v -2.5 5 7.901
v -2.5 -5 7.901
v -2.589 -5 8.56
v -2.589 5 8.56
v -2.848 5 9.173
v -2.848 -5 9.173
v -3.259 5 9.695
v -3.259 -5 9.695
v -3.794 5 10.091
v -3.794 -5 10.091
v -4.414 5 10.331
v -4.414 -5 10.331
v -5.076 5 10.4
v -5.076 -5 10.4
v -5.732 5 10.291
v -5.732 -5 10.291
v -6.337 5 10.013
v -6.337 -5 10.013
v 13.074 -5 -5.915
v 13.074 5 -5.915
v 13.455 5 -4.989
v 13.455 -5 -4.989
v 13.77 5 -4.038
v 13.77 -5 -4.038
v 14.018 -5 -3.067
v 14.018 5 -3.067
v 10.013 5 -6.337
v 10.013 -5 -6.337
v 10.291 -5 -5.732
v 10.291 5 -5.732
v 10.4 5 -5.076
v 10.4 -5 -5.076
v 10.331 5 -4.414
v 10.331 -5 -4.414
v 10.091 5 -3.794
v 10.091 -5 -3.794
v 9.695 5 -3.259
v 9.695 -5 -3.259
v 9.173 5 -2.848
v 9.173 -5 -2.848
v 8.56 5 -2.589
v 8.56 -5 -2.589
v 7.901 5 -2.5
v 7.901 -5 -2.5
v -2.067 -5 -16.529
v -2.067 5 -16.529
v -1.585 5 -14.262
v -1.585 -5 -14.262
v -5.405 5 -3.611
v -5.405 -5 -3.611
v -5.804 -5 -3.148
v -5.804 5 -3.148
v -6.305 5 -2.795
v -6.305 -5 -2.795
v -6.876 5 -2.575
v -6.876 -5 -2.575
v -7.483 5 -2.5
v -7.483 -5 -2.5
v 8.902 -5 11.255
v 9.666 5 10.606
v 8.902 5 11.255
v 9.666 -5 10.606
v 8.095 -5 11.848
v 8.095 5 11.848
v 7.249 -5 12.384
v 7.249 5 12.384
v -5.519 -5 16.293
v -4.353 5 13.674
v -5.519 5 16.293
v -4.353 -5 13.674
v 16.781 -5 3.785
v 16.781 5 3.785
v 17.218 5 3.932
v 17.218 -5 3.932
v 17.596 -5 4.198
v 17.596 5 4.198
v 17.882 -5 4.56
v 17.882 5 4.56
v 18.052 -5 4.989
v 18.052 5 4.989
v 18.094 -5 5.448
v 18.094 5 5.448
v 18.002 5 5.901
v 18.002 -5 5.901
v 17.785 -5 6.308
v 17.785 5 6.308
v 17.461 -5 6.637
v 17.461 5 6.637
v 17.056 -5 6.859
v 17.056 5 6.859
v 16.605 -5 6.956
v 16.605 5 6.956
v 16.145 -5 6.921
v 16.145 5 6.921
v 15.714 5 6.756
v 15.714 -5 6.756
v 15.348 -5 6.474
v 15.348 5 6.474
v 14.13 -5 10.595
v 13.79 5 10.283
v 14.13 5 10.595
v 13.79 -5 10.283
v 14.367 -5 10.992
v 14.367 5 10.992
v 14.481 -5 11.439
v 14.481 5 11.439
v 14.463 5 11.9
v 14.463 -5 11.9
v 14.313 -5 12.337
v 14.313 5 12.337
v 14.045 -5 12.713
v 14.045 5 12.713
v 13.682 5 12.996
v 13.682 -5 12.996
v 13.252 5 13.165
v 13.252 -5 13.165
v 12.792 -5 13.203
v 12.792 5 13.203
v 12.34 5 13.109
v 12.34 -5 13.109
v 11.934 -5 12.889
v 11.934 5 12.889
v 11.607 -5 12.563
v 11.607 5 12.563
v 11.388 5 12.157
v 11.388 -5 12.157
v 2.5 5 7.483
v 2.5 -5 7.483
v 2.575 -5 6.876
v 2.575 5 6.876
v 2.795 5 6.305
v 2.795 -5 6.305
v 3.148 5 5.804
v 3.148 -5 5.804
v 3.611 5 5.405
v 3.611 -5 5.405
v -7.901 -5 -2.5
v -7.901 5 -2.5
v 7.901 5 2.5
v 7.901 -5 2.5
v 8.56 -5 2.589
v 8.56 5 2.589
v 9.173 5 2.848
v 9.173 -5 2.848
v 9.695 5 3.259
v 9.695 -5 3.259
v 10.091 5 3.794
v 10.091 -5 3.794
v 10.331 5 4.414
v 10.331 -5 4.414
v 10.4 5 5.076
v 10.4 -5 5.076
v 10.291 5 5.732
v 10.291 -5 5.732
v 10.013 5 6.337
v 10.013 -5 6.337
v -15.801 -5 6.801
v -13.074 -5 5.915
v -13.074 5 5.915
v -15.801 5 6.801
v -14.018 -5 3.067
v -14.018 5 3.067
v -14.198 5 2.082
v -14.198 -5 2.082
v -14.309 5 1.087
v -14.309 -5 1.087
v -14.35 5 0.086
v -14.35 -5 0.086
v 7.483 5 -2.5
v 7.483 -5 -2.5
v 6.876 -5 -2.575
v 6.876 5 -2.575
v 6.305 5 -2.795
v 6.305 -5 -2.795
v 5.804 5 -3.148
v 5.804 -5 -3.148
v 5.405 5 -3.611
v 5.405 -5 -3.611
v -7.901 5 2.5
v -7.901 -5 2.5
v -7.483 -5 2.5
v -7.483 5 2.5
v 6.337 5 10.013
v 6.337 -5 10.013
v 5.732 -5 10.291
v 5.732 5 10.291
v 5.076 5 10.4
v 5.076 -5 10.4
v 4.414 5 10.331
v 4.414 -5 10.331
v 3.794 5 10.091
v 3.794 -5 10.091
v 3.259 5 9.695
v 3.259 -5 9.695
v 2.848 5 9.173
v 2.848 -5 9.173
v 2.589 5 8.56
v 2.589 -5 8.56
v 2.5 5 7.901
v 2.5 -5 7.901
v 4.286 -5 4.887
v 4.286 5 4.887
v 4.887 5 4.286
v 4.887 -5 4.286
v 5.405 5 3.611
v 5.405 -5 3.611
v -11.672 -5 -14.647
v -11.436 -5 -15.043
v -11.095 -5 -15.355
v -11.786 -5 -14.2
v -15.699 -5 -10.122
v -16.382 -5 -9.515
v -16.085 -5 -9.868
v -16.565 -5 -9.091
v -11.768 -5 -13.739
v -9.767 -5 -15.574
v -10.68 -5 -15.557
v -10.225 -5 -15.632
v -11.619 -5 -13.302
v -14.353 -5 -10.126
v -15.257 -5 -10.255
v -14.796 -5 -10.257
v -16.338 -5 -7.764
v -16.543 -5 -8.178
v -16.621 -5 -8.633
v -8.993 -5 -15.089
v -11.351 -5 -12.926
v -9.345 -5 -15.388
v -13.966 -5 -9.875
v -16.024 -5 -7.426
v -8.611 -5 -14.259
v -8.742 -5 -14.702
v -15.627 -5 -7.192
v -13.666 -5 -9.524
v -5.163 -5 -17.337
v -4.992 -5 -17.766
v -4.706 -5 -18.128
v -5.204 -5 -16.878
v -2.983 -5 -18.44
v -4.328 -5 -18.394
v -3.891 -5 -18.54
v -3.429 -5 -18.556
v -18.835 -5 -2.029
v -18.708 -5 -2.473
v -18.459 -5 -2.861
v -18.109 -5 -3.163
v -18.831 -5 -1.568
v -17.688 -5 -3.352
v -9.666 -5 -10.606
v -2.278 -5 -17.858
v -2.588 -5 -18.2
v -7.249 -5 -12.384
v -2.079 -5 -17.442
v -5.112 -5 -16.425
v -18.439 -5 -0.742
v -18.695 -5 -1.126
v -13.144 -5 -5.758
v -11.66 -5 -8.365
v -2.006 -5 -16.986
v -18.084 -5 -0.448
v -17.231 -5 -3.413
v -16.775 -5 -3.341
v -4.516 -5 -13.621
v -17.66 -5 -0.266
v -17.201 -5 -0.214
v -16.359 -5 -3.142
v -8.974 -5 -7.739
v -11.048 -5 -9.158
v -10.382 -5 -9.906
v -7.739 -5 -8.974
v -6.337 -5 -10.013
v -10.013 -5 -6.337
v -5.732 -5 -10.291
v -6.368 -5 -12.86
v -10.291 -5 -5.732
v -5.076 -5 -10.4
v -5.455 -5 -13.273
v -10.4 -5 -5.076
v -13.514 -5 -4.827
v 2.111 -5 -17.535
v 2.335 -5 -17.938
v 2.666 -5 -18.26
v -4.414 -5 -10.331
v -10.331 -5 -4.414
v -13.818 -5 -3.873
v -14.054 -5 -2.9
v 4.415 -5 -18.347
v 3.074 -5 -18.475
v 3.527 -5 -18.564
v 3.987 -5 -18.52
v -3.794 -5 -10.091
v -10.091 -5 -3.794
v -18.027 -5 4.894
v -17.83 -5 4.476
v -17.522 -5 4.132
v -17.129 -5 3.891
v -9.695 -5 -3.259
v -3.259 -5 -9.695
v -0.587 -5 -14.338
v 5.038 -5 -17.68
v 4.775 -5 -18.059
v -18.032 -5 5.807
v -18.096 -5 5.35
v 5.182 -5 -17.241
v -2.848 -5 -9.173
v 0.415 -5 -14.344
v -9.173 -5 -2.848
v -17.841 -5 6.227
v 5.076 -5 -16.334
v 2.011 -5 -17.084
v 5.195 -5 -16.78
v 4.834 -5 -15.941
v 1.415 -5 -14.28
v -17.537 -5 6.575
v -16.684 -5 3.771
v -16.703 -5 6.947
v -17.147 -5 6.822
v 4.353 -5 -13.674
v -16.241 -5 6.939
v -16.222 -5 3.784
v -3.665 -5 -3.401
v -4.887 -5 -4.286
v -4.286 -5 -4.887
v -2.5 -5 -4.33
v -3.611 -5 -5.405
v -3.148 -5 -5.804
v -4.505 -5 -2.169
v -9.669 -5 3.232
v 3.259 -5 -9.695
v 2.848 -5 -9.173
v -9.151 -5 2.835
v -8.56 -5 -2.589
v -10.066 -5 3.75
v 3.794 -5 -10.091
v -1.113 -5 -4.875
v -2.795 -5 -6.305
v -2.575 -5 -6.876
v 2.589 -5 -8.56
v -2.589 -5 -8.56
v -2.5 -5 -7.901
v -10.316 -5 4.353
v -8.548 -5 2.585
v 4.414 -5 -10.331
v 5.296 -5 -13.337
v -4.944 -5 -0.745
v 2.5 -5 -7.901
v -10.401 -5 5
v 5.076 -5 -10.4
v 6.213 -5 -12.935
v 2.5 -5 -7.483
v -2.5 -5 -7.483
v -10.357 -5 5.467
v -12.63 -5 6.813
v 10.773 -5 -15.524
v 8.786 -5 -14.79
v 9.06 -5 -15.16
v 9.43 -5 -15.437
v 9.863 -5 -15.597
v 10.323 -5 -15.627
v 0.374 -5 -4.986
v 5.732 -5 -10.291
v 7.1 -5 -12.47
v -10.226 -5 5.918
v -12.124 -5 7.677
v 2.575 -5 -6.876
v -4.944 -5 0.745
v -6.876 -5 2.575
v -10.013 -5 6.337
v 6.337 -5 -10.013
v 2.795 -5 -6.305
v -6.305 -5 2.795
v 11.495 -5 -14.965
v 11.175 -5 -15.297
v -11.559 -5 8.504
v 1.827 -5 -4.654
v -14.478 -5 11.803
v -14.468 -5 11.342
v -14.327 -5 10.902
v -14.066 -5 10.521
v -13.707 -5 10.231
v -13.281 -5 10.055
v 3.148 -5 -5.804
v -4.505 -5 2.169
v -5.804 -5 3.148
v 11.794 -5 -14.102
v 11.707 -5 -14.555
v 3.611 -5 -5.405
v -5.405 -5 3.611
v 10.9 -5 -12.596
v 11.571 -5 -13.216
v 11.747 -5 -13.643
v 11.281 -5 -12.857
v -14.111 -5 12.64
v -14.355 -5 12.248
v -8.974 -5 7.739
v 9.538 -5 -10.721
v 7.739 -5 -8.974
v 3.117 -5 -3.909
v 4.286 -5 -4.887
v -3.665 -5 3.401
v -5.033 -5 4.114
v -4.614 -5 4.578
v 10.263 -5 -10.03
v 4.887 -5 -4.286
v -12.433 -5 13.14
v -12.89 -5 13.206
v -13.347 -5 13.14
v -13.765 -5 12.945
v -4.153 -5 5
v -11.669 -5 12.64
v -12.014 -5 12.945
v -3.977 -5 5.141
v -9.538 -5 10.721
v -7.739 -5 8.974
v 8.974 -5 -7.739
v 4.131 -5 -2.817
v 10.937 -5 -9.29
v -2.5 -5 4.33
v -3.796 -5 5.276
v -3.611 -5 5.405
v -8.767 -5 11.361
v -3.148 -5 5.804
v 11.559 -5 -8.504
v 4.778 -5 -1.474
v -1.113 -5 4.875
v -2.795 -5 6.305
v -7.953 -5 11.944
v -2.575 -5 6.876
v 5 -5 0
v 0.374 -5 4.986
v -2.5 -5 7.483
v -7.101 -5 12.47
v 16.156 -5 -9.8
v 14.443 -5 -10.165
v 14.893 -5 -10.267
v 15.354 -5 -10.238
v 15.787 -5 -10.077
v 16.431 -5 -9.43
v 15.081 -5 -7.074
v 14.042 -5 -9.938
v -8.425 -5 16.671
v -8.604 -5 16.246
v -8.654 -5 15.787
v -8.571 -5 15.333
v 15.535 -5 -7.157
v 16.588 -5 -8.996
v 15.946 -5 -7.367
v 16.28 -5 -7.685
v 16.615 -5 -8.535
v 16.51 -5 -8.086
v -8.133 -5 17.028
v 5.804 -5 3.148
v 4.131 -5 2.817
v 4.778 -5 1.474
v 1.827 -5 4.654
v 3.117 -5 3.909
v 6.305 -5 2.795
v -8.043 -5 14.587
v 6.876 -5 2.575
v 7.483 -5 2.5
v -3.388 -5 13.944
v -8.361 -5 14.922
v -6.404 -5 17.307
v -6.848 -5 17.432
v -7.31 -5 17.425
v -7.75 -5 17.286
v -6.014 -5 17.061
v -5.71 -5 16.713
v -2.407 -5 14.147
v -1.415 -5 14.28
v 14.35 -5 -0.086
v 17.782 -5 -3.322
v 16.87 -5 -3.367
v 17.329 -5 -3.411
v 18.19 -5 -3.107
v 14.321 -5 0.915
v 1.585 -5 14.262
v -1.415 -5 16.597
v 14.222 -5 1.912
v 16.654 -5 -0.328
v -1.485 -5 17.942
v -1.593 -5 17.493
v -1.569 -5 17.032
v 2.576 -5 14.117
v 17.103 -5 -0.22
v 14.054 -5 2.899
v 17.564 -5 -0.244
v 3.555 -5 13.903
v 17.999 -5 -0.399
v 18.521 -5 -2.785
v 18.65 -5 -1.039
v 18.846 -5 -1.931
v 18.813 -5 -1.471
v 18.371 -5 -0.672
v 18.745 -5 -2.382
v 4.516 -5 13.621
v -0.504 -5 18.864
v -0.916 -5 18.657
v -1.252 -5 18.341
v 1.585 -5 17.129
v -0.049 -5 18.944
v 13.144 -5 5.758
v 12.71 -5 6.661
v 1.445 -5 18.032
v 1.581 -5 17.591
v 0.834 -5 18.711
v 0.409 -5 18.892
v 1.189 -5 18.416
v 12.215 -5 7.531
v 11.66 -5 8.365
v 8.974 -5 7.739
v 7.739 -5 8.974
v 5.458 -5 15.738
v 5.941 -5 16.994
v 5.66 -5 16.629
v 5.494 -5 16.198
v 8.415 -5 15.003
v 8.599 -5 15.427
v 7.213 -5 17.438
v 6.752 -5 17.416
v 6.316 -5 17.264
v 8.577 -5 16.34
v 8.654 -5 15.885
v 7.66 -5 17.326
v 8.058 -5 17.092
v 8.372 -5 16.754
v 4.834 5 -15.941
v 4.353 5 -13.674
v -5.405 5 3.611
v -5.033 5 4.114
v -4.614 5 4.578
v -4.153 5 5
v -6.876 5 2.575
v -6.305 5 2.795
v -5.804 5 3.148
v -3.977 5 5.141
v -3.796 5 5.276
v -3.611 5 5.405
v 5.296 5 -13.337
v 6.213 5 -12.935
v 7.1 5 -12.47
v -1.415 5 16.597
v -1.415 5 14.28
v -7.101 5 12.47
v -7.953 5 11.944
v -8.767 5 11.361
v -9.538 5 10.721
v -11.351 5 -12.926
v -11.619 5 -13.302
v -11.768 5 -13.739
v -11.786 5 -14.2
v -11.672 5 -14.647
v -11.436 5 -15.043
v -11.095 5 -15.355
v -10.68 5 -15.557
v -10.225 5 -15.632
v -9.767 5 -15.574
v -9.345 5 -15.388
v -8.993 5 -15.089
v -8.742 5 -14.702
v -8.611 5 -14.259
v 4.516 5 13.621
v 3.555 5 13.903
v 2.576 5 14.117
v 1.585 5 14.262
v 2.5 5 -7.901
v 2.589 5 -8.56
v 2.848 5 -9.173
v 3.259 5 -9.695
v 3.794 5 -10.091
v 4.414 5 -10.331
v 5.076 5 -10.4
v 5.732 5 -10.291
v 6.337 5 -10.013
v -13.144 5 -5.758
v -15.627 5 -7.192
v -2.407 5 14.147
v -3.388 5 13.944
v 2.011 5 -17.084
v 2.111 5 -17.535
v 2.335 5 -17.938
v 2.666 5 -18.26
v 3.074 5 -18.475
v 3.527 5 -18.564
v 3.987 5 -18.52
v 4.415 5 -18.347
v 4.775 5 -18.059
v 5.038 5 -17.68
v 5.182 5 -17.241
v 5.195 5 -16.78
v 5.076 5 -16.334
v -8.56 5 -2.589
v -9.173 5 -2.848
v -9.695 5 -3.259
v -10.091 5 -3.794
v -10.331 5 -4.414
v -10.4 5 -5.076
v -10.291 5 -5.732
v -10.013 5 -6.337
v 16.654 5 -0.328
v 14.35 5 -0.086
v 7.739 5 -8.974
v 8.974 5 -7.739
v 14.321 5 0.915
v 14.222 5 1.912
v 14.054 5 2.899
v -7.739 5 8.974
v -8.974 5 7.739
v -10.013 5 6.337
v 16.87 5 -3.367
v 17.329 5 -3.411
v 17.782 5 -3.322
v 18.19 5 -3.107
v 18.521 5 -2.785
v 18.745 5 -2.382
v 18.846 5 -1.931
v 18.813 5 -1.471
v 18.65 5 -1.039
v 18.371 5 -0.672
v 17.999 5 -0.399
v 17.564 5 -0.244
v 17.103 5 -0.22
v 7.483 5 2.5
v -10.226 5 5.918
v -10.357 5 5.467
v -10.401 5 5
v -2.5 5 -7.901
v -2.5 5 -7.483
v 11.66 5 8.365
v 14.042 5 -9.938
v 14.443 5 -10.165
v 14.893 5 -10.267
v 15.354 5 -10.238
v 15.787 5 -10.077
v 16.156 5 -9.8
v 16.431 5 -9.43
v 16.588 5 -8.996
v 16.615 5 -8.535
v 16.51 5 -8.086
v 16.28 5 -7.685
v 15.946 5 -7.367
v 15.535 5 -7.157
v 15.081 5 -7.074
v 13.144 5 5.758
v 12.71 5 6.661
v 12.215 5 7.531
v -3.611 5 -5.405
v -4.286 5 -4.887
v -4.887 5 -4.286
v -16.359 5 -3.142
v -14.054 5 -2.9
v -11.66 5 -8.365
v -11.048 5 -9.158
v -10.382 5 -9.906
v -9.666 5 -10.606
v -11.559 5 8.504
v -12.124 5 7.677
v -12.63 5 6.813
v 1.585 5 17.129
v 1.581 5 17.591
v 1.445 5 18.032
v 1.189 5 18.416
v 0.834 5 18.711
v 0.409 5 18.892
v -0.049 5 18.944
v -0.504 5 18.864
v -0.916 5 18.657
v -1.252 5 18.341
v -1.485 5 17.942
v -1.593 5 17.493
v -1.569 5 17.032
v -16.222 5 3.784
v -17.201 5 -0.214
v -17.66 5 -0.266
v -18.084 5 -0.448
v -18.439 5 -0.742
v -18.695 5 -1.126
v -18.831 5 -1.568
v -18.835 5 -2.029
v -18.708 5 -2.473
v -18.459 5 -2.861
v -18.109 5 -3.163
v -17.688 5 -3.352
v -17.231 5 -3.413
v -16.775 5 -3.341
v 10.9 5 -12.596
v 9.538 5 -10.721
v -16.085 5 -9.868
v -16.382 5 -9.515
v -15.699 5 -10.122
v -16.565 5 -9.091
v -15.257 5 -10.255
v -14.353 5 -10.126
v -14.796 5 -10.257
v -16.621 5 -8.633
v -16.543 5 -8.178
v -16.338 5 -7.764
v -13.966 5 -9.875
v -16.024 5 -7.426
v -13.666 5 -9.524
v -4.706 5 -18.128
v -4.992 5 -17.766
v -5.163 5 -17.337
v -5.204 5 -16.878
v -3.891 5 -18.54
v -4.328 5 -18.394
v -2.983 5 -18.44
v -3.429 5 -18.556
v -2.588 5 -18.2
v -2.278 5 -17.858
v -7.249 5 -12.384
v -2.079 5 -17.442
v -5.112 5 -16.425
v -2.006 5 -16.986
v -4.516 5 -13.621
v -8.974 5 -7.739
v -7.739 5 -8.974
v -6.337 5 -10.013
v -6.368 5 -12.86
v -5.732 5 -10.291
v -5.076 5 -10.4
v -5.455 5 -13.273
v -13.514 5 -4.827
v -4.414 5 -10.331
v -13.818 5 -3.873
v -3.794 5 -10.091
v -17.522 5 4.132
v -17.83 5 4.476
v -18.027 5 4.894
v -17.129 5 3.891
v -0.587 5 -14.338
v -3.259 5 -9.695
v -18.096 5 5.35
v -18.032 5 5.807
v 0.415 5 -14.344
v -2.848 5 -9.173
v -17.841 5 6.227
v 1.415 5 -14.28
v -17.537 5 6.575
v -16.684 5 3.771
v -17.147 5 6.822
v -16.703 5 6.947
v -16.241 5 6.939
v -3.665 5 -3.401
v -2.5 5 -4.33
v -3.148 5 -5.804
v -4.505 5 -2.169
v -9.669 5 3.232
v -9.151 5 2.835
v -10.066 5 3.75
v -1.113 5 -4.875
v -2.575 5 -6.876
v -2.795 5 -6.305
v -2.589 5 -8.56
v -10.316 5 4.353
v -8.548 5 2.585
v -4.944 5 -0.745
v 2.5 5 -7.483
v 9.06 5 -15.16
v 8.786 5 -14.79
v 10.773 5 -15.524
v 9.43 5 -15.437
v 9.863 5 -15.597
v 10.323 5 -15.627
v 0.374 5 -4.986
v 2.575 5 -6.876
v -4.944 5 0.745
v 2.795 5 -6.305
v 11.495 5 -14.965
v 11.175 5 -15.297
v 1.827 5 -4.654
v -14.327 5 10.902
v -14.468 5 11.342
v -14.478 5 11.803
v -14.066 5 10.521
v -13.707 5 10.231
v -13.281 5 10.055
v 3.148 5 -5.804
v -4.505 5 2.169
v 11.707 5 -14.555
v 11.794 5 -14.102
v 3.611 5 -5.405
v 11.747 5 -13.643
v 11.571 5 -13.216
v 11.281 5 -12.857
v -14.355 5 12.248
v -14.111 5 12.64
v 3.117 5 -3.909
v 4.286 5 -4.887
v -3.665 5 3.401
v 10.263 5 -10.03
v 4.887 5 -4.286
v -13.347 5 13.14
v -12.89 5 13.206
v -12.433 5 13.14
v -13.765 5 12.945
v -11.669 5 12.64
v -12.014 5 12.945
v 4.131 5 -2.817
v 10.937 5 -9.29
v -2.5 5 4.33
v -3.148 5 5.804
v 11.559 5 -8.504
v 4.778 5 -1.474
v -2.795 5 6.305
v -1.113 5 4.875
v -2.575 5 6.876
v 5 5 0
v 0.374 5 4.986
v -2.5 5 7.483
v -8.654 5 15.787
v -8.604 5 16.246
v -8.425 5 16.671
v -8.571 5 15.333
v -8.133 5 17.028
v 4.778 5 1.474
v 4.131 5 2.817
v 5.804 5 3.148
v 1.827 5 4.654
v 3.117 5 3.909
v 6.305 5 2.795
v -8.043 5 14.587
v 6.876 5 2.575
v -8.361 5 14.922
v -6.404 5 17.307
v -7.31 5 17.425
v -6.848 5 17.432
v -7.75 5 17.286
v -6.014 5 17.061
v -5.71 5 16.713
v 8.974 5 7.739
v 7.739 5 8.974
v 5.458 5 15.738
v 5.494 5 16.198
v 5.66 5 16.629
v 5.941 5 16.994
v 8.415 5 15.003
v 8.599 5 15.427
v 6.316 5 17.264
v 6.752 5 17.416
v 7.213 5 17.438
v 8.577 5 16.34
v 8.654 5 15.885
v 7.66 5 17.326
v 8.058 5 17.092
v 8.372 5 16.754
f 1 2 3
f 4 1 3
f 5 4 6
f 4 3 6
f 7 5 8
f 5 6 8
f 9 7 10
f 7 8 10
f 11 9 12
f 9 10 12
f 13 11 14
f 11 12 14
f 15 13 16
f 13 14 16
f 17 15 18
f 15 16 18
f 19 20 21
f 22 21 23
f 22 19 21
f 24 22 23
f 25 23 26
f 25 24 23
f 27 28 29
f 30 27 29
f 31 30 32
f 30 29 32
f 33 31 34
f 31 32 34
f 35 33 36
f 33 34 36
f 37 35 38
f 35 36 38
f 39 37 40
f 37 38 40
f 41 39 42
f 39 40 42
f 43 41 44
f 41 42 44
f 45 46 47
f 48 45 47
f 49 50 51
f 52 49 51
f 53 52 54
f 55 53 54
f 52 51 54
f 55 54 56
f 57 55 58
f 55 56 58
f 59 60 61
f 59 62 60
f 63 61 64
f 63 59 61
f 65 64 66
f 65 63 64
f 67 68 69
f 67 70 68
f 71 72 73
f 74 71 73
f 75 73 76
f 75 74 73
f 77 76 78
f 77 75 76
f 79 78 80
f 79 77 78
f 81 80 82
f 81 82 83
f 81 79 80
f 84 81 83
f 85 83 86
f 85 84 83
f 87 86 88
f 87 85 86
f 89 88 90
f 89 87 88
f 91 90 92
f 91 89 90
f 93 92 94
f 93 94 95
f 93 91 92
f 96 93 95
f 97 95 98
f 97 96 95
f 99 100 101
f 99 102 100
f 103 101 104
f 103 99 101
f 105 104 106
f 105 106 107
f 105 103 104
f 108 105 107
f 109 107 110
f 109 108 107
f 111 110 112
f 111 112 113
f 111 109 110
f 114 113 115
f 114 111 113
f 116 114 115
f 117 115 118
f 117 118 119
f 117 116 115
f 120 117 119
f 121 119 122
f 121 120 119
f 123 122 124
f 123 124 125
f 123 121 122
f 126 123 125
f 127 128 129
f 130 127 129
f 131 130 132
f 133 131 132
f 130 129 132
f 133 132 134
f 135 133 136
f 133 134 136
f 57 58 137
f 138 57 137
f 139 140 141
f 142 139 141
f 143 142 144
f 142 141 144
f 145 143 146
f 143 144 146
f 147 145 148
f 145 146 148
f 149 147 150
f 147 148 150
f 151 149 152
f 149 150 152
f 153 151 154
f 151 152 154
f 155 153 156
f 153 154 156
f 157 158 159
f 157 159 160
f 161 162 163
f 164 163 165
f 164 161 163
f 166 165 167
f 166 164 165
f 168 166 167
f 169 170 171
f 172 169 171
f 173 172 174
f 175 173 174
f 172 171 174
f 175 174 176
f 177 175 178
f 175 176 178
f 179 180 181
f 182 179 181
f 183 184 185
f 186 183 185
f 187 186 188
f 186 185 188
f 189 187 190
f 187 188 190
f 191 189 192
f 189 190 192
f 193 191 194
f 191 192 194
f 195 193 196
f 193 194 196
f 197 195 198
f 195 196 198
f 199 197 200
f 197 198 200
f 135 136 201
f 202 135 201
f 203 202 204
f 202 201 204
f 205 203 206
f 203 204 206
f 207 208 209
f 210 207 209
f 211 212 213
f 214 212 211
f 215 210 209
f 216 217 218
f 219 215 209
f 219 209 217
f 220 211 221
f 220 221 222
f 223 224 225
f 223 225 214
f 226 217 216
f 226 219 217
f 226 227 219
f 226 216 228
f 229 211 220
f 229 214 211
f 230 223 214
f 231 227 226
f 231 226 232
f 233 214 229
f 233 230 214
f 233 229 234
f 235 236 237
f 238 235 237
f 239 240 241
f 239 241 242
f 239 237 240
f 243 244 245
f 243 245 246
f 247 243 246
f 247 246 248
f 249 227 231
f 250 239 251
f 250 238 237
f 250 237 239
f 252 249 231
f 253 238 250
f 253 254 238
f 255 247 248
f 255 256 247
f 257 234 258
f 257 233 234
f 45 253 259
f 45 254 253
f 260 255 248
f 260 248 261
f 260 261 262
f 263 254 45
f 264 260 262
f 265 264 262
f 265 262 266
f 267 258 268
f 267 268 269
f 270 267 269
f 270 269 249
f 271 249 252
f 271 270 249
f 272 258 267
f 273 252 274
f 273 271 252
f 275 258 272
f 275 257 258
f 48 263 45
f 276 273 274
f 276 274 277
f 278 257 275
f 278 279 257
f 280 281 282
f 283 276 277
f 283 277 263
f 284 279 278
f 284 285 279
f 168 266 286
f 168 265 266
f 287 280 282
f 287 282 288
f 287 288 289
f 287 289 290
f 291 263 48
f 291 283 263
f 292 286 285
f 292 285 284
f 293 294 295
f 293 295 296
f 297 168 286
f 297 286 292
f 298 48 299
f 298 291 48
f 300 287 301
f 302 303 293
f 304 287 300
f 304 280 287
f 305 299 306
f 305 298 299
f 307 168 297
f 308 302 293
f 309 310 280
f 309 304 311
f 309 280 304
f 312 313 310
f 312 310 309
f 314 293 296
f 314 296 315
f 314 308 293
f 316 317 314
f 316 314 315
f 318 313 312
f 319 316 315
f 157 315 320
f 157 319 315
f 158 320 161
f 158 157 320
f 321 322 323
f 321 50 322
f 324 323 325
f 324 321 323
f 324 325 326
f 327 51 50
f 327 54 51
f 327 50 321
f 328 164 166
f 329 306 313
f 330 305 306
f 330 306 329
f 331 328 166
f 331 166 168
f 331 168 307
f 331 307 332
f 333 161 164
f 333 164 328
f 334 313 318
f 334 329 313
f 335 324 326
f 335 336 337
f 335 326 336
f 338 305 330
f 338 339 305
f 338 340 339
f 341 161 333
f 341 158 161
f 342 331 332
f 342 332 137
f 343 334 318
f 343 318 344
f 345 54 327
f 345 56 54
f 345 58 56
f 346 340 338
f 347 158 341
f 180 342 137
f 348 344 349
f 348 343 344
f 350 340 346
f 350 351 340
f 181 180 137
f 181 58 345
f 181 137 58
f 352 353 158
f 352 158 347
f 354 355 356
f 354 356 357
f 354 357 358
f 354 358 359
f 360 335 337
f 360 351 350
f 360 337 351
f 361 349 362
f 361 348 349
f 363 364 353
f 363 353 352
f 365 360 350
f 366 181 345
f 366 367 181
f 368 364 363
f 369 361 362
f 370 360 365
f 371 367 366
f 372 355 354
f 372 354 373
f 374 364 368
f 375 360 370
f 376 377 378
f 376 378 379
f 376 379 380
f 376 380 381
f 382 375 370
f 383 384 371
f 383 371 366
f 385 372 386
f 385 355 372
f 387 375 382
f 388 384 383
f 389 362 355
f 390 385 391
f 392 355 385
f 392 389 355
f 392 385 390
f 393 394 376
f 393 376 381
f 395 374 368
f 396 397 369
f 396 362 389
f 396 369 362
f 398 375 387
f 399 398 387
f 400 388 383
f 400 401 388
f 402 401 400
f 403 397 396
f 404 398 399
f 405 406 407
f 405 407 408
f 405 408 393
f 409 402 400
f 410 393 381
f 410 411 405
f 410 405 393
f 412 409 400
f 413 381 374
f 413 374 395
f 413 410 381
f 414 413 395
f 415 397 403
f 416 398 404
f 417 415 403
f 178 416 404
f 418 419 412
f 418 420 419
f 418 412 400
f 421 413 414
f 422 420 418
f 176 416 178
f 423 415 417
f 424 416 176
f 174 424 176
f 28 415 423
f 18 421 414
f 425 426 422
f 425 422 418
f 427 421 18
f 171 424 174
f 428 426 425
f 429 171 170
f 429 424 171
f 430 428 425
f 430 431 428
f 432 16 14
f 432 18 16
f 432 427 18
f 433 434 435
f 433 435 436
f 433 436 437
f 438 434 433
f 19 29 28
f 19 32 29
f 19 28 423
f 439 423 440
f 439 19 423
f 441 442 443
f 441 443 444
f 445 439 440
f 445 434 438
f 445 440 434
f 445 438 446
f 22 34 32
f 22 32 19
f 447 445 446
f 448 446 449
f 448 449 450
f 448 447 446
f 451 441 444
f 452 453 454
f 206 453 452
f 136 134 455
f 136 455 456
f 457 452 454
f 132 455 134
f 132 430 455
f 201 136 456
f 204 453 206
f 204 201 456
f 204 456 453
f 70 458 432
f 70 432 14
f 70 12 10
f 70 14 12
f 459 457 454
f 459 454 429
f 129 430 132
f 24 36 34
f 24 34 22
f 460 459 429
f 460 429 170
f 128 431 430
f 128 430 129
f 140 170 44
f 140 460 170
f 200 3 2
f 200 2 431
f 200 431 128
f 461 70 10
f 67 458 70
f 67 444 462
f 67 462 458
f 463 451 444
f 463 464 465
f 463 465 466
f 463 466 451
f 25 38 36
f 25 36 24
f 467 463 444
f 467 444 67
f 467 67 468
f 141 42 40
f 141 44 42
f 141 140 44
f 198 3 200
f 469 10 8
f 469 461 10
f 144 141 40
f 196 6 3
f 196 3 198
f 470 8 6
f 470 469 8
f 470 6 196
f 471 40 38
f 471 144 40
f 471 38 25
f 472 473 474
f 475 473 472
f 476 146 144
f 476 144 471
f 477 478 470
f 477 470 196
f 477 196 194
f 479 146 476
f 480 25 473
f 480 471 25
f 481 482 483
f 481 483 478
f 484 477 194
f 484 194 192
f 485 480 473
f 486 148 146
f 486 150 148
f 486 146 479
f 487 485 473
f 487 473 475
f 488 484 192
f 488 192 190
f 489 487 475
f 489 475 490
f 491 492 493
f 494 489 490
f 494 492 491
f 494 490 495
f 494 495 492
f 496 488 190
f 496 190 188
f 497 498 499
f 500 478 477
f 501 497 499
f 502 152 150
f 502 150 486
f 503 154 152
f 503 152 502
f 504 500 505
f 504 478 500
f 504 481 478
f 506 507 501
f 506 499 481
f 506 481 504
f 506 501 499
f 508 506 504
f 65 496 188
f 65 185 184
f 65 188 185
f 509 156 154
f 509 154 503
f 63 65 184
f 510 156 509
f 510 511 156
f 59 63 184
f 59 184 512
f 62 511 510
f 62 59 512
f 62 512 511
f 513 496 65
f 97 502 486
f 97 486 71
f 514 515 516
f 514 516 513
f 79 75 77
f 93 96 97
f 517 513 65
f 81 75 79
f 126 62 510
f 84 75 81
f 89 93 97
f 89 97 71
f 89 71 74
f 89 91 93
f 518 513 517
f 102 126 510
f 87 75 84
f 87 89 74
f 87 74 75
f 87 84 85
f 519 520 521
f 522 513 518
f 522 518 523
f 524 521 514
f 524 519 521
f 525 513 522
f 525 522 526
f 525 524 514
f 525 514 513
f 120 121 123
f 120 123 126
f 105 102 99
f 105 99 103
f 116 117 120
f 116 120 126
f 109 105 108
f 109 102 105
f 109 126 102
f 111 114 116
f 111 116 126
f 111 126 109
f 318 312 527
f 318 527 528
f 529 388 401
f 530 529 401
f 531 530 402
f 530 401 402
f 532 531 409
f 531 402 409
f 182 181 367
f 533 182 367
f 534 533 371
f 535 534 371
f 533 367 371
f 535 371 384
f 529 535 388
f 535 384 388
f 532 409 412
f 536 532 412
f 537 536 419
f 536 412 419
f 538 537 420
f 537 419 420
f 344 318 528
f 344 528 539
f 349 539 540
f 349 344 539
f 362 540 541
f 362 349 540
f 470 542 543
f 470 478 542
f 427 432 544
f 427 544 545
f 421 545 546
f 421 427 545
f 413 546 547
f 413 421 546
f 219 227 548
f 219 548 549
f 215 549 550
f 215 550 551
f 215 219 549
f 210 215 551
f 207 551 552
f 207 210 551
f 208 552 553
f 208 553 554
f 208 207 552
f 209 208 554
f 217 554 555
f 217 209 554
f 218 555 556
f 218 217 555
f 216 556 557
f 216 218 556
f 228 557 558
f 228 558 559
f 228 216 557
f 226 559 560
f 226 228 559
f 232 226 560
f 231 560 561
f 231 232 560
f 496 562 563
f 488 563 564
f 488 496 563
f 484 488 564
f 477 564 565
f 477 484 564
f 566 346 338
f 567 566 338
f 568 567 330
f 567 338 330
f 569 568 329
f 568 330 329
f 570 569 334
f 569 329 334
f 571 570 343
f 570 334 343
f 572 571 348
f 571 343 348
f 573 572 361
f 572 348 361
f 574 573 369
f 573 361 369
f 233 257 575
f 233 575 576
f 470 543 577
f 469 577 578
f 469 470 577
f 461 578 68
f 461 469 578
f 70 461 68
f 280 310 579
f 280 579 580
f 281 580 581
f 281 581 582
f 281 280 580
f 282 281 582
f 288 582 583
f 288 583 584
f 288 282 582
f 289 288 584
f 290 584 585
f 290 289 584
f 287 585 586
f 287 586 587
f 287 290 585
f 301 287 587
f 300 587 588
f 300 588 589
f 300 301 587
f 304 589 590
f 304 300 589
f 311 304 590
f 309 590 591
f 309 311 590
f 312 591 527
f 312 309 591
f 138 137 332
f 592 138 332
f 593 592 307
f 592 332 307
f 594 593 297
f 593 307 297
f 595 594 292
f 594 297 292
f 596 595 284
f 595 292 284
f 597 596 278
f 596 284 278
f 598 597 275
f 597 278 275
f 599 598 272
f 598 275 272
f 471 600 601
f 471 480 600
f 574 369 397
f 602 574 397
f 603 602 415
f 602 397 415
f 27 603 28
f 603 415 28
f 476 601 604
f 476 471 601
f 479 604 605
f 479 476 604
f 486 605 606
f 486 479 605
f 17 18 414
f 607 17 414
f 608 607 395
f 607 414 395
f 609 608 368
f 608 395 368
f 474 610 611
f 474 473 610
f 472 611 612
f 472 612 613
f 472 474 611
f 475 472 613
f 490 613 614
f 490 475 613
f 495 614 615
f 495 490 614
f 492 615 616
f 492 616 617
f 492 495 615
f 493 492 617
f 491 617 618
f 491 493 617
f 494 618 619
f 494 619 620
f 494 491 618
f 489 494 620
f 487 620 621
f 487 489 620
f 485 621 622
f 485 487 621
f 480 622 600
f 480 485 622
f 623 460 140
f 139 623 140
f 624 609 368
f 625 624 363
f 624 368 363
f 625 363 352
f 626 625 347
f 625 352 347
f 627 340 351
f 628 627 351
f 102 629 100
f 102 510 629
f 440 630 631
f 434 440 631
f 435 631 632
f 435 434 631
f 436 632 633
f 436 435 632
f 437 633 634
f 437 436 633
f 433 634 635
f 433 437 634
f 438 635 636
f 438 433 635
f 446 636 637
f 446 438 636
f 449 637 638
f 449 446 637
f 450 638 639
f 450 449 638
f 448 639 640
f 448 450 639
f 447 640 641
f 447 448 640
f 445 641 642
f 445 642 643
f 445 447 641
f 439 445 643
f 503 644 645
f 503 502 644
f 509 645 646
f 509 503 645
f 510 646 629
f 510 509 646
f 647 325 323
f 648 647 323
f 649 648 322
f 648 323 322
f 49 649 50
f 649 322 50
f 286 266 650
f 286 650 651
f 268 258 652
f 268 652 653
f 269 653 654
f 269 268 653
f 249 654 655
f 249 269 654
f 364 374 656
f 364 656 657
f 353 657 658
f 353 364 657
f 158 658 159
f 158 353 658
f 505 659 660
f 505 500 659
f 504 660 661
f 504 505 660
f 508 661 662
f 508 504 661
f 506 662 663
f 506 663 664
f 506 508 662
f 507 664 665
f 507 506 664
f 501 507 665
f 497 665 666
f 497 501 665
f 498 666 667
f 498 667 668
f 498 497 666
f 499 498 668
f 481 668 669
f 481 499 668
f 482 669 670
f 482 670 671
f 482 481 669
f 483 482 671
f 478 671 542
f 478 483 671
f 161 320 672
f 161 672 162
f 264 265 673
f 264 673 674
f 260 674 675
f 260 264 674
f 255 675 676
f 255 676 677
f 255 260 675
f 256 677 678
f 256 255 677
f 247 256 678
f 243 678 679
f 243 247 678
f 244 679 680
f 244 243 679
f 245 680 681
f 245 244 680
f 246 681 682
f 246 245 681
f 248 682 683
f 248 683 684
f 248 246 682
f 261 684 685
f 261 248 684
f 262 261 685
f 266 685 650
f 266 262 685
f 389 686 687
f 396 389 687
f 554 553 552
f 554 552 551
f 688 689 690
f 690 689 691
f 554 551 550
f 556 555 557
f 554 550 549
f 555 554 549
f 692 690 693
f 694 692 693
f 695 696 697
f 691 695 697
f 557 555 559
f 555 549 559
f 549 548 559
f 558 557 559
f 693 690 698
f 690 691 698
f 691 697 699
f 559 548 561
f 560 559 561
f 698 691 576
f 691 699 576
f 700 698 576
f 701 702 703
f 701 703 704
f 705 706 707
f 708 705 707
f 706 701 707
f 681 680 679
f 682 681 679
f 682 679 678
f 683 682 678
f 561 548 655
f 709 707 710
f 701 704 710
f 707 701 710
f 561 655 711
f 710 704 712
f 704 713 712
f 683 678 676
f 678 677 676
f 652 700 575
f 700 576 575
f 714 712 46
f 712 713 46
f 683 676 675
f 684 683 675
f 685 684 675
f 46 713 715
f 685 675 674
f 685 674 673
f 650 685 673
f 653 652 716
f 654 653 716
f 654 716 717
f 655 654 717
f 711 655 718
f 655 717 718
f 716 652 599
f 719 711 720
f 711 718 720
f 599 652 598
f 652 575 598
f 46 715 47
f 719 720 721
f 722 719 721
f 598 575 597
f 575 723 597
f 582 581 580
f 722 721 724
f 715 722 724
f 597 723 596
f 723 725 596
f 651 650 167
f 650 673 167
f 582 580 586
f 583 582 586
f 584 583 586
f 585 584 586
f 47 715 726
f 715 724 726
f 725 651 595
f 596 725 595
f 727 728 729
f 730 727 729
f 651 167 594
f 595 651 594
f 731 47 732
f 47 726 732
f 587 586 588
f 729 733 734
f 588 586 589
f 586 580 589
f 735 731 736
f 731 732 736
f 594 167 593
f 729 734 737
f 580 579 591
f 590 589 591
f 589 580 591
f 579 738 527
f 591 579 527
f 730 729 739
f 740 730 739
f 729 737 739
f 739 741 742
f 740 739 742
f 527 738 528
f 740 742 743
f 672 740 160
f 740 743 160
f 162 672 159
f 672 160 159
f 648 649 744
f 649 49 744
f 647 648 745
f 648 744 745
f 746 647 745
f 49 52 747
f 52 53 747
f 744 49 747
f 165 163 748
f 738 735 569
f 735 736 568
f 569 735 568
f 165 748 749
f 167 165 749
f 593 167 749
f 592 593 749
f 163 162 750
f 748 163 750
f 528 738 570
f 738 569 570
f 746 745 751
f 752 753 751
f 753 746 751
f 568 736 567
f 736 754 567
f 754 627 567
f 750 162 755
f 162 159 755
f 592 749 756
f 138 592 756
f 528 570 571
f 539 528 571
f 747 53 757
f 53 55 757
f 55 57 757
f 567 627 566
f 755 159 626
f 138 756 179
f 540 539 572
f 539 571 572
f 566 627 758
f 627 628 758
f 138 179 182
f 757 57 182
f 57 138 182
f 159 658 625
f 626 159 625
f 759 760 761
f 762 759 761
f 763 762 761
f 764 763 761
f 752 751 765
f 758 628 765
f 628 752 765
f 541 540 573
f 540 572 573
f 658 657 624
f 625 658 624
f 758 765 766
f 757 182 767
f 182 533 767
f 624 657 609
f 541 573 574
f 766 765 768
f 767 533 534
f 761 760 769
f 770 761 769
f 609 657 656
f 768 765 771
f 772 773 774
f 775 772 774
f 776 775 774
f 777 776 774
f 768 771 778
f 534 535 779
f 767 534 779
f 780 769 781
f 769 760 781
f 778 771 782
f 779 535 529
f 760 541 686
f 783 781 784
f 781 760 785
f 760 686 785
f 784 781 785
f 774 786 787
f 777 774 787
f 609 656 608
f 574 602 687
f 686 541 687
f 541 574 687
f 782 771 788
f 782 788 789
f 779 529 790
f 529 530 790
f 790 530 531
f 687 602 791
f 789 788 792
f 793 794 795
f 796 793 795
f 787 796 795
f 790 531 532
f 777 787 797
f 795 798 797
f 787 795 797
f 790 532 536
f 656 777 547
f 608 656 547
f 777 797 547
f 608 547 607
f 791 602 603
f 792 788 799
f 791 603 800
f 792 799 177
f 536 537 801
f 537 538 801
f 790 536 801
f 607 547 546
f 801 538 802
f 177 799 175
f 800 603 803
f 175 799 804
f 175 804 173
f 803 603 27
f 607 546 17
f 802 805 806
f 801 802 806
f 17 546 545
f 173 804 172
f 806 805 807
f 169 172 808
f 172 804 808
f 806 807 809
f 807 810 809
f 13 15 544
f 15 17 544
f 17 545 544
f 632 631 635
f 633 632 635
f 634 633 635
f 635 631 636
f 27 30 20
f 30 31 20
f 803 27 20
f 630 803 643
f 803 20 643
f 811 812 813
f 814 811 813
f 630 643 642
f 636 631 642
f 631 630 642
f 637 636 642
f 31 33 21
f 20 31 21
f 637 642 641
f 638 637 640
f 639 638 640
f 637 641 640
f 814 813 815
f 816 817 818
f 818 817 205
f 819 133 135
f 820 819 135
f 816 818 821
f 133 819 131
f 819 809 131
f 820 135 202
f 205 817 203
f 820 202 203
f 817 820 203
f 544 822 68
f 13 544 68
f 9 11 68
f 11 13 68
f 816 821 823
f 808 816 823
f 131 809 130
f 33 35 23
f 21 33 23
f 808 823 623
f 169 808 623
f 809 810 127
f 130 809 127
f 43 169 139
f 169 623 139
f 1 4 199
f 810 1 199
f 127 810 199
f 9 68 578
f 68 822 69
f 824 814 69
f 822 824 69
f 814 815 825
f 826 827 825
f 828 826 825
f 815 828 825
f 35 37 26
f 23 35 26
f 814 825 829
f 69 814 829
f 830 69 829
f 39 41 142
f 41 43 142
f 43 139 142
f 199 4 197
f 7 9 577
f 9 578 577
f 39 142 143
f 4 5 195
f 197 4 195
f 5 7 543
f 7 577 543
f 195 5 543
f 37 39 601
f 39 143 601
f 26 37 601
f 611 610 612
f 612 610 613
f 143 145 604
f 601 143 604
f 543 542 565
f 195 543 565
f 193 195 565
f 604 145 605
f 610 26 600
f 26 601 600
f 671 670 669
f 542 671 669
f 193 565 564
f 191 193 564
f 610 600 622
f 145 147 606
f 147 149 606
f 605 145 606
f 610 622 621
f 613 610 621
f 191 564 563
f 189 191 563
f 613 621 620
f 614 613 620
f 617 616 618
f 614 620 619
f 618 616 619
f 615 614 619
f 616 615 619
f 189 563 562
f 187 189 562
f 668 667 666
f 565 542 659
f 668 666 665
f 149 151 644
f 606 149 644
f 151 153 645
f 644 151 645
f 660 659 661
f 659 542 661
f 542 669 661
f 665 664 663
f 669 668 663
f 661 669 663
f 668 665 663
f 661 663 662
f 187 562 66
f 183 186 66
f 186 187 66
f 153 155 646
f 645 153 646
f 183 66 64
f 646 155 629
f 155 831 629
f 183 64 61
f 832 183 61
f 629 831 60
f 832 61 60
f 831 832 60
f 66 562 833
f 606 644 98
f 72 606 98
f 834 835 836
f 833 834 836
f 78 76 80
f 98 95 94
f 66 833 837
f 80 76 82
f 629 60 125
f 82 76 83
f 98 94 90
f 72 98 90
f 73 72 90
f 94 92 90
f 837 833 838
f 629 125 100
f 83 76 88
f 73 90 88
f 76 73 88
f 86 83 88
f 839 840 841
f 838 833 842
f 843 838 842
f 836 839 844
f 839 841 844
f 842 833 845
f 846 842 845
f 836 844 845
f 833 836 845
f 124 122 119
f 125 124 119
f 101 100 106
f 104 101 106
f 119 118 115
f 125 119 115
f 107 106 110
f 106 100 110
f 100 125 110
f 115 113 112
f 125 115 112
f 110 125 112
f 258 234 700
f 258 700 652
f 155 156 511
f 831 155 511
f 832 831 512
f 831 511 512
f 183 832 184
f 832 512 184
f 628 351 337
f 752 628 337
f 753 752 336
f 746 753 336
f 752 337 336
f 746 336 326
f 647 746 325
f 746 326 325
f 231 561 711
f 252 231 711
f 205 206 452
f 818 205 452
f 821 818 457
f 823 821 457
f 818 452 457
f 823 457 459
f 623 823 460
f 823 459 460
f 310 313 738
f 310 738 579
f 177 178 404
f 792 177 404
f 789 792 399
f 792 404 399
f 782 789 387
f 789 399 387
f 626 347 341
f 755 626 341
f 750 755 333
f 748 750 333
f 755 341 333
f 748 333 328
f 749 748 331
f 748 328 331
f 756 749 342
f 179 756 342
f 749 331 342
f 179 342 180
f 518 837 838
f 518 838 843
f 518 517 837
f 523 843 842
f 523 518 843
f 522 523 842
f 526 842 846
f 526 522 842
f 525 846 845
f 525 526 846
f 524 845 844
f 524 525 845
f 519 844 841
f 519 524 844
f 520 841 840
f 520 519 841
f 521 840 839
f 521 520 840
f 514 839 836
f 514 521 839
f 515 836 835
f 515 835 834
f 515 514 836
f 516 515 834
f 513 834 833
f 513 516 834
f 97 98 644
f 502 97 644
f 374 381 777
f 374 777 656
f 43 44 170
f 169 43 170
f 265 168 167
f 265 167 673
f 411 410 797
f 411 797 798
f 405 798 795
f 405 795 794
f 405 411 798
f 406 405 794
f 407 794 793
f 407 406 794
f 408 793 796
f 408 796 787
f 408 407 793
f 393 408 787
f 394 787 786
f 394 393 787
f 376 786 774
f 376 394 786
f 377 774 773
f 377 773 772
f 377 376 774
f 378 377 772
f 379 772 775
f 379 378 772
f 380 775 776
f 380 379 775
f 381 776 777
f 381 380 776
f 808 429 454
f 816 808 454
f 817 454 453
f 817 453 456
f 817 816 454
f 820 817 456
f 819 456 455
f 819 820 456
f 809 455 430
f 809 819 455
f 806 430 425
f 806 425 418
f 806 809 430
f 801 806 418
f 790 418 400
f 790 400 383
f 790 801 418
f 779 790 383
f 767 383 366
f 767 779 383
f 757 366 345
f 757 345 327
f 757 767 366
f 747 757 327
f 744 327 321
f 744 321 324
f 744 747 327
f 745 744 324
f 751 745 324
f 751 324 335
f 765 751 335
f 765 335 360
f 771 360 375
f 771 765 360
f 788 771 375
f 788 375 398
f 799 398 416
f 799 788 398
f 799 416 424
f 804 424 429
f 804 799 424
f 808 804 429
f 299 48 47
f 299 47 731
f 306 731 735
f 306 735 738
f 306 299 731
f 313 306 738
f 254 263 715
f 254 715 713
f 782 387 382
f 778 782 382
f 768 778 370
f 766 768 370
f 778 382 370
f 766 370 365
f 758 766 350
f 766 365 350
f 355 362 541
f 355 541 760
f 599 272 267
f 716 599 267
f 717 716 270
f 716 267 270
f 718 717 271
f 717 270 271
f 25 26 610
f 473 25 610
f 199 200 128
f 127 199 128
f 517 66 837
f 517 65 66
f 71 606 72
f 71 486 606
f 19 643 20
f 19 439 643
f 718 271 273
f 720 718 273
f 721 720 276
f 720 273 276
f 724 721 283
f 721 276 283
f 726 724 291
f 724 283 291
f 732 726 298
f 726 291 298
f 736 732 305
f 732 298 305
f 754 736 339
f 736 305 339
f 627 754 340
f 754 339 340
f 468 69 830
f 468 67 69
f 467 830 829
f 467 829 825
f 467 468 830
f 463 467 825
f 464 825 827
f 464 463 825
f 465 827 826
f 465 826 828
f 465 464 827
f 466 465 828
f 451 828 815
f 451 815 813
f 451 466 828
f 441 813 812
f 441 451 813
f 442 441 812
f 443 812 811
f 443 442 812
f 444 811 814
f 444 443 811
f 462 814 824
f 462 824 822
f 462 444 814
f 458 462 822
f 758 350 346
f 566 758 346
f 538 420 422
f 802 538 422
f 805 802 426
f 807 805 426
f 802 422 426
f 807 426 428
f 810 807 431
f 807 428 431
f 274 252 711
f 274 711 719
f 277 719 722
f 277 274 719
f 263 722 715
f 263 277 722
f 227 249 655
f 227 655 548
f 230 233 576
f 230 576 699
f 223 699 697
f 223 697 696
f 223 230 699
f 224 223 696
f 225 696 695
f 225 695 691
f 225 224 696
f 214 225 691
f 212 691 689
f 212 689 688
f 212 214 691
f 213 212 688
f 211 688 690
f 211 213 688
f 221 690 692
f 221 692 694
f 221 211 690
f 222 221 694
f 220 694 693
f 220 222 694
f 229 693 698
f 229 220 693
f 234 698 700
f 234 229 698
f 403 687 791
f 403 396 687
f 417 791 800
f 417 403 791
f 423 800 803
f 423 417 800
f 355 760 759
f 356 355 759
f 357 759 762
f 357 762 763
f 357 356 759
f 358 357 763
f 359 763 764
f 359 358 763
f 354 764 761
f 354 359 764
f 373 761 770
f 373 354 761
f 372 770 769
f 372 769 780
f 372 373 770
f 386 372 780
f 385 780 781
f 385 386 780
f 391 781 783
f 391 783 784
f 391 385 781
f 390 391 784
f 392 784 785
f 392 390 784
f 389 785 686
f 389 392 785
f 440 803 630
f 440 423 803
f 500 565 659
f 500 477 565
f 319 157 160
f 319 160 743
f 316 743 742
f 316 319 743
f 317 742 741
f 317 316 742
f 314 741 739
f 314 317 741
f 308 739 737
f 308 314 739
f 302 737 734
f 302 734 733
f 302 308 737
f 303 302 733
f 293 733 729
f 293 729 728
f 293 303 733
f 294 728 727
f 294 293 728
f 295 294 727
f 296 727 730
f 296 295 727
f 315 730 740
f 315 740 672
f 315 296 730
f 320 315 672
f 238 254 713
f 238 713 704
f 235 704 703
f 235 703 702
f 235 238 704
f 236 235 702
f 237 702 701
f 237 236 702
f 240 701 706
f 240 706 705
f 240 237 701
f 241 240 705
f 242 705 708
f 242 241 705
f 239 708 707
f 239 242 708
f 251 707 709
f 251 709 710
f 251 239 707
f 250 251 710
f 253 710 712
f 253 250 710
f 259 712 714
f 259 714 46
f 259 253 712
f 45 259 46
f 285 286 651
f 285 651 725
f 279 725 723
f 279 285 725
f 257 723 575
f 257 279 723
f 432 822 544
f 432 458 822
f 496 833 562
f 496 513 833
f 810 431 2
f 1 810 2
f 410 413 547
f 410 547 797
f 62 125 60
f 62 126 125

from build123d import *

# Parameters (mm, degrees)
F0_R     = 5
F1_DEPTH = 5
F3_DEPTH = 10


with BuildPart() as f1:
    # F0 (on Front) → F1 (new body, symmetric)
    with BuildSketch(Plane.XZ):
        with BuildLine():
            Line((-8.043049, 14.587102), (-7.100528, 12.470164))
            ThreePointArc((-7.100528, 12.470164), (-8.365104, 11.659654), (-9.538033, 10.721401))
            Line((-9.538033, 10.721401), (-11.668586, 12.63976))
            ThreePointArc((-11.668586, 12.63976), (-14.247489, 12.452749), (-13.2808, 10.054578))
            Line((-13.2808, 10.054578), (-11.558728, 8.504017))
            ThreePointArc((-11.558728, 8.504017), (-12.384311, 7.24923), (-13.074213, 5.91502))
            Line((-13.074213, 5.91502), (-15.800837, 6.800954))
            ThreePointArc((-15.800837, 6.800954), (-18.080718, 5.581177), (-16.22218, 3.783526))
            Line((-16.22218, 3.783526), (-14.018319, 3.067448))
            ThreePointArc((-14.018319, 3.067448), (-14.262159, 1.585348), (-14.349743, 0.085878))
            Line((-14.349743, 0.085878), (-17.20098, -0.213799))
            ThreePointArc((-17.20098, -0.213799), (-18.787627, -2.255432), (-16.358597, -3.141732))
            Line((-16.358597, -3.141732), (-14.054015, -2.899511))
            ThreePointArc((-14.054015, -2.899511), (-13.673949, -4.352656), (-13.144072, -5.758113))
            Line((-13.144072, -5.758113), (-15.626917, -7.191584))
            ThreePointArc((-15.626917, -7.191584), (-16.245984, -9.702056), (-13.666465, -9.523756))
            Line((-13.666465, -9.523756), (-11.659644, -8.365118))
            ThreePointArc((-11.659644, -8.365118), (-10.72139, -9.538045), (-9.665672, -10.606474))
            Line((-9.665672, -10.606474), (-11.350818, -12.925879))
            ThreePointArc((-11.350818, -12.925879), (-10.895264, -15.471106), (-8.611276, -14.259036))
            Line((-8.611276, -14.259036), (-7.249215, -12.38432))
            ThreePointArc((-7.249215, -12.38432), (-5.915005, -13.07422), (-4.515989, -13.620879))
            Line((-4.515989, -13.620879), (-5.11206, -16.425172))
            ThreePointArc((-5.11206, -16.425172), (-3.660653, -18.565062), (-2.06712, -16.528799))
            Line((-2.06712, -16.528799), (-1.585331, -14.262161))
            ThreePointArc((-1.585331, -14.262161), (-0.085861, -14.349743), (1.414549, -14.28011))
            Line((1.414549, -14.28011), (2.01062, -17.084403))
            ThreePointArc((2.01062, -17.084403), (4.206918, -18.448949), (4.83446, -15.940583))
            Line((4.83446, -15.940583), (4.352671, -13.673944))
            ThreePointArc((4.352671, -13.673944), (5.758128, -13.144066), (7.100499, -12.470181))
            Line((7.100499, -12.470181), (8.785646, -14.789586))
            ThreePointArc((8.785646, -14.789586), (11.347075, -15.142846), (10.900118, -12.596095))
            Line((10.900118, -12.596095), (9.538057, -10.721379))
            ThreePointArc((9.538057, -10.721379), (10.606485, -9.66566), (11.558708, -8.504044))
            Line((11.558708, -8.504044), (14.041553, -9.937515))
            ThreePointArc((14.041553, -9.937515), (16.525219, -9.218407), (15.081047, -7.073628))
            Line((15.081047, -7.073628), (13.074227, -5.914989))
            ThreePointArc((13.074227, -5.914989), (13.620884, -4.515973), (14.018312, -3.067481))
            Line((14.018312, -3.067481), (16.869549, -3.367158))
            ThreePointArc((16.869549, -3.367158), (18.846003, -1.700022), (16.654325, -0.328066))
            Line((16.654325, -0.328066), (14.349743, -0.085845))
            ThreePointArc((14.349743, -0.085845), (14.280109, 1.414566), (14.054022, 2.899478))
            Line((14.054022, 2.899478), (16.780646, 3.785412))
            ThreePointArc((16.780646, 3.785412), (17.908141, 6.112313), (15.34792, 6.474221))
            Line((15.34792, 6.474221), (13.144059, 5.758143))
            ThreePointArc((13.144059, 5.758143), (12.470173, 7.100514), (11.659664, 8.365091))
            Line((11.659664, 8.365091), (13.790217, 10.28345))
            ThreePointArc((13.790217, 10.28345), (13.8738, 12.867773), (11.387719, 12.157057))
            Line((11.387719, 12.157057), (9.665647, 10.606496))
            ThreePointArc((9.665647, 10.606496), (8.504031, 11.558718), (7.249244, 12.384303))
            Line((7.249244, 12.384303), (8.415335, 15.003385))
            ThreePointArc((8.415335, 15.003385), (7.440552, 17.398278), (5.458479, 15.737827))
            Line((5.458479, 15.737827), (4.515958, 13.620889))
            ThreePointArc((4.515958, 13.620889), (3.067464, 14.018315), (1.585364, 14.262157))
            Line((1.585364, 14.262157), (1.585364, 17.129099))
            ThreePointArc((1.585364, 17.129099), (-0.279235, 18.920463), (-1.414582, 16.597383))
            Line((-1.414582, 16.597383), (-1.414582, 14.280107))
            ThreePointArc((-1.414582, 14.280107), (-2.899494, 14.054018), (-4.35264, 13.673954))
            Line((-4.35264, 13.673954), (-5.51873, 16.293037))
            ThreePointArc((-5.51873, 16.293037), (-7.950739, 17.171128), (-8.043049, 14.587102))
        make_face()
        Circle(F0_R, mode=Mode.SUBTRACT)
    extrude(amount=F1_DEPTH, both=True)

    # F2 (on face) → F3 (cut)
    with BuildSketch(Plane.XZ.offset(5)):
        with BuildLine():
            ThreePointArc((-6.336898, 10.013302), (-8.379215, 8.379215), (-10.013302, 6.336898))
            ThreePointArc((-10.013302, 6.336898), (-10.301966, 5.695961), (-10.400791, 5))
            Line((-10.400791, 5), (-4.153312, 5))
            ThreePointArc((-4.153312, 5), (-3.887479, 5.209367), (-3.611111, 5.404616))
            ThreePointArc((-3.611111, 5.404616), (-2.795207, 6.304803), (-2.5, 7.483315))
            Line((-2.5, 7.483315), (-2.5, 7.900791))
            ThreePointArc((-2.5, 7.900791), (-3.794232, 10.090796), (-6.336898, 10.013302))
        make_face()
        with BuildLine():
            Line((-4.153312, 5), (-10.400791, 5))
            ThreePointArc((-10.400791, 5), (-9.668558, 3.232233), (-7.900791, 2.5))
            Line((-7.900791, 2.5), (-7.483315, 2.5))
            ThreePointArc((-7.483315, 2.5), (-6.304803, 2.795207), (-5.404616, 3.611111))
            ThreePointArc((-5.404616, 3.611111), (-4.829156, 4.350776), (-4.153312, 5))
        make_face()
        with BuildLine():
            ThreePointArc((6.336898, 10.013302), (3.794232, 10.090796), (2.5, 7.900791))
            Line((2.5, 7.900791), (2.5, 7.483315))
            ThreePointArc((2.5, 7.483315), (2.795207, 6.304803), (3.611111, 5.404616))
            ThreePointArc((3.611111, 5.404616), (4.596194, 4.596194), (5.404616, 3.611111))
            ThreePointArc((5.404616, 3.611111), (6.304803, 2.795207), (7.483315, 2.5))
            Line((7.483315, 2.5), (7.900791, 2.5))
            ThreePointArc((7.900791, 2.5), (10.090796, 3.794232), (10.013302, 6.336898))
            ThreePointArc((10.013302, 6.336898), (8.379215, 8.379215), (6.336898, 10.013302))
        make_face()
        with BuildLine():
            Line((-7.483315, -2.5), (-7.900791, -2.5))
            ThreePointArc((-7.900791, -2.5), (-10.090796, -3.794232), (-10.013302, -6.336898))
            ThreePointArc((-10.013302, -6.336898), (-8.379215, -8.379215), (-6.336898, -10.013302))
            ThreePointArc((-6.336898, -10.013302), (-3.794232, -10.090796), (-2.5, -7.900791))
            Line((-2.5, -7.900791), (-2.5, -7.483315))
            ThreePointArc((-2.5, -7.483315), (-2.795207, -6.304803), (-3.611111, -5.404616))
            ThreePointArc((-3.611111, -5.404616), (-4.596194, -4.596194), (-5.404616, -3.611111))
            ThreePointArc((-5.404616, -3.611111), (-6.304803, -2.795207), (-7.483315, -2.5))
        make_face()
        with BuildLine():
            ThreePointArc((5.404616, -3.611111), (4.596194, -4.596194), (3.611111, -5.404616))
            ThreePointArc((3.611111, -5.404616), (2.795207, -6.304803), (2.5, -7.483315))
            Line((2.5, -7.483315), (2.5, -7.900791))
            ThreePointArc((2.5, -7.900791), (3.794232, -10.090796), (6.336898, -10.013302))
            ThreePointArc((6.336898, -10.013302), (8.379215, -8.379215), (10.013302, -6.336898))
            ThreePointArc((10.013302, -6.336898), (10.090796, -3.794232), (7.900791, -2.5))
            Line((7.900791, -2.5), (7.483315, -2.5))
            ThreePointArc((7.483315, -2.5), (6.304803, -2.795207), (5.404616, -3.611111))
        make_face()
    extrude(amount=-F3_DEPTH, mode=Mode.SUBTRACT)


solid = f1.part
